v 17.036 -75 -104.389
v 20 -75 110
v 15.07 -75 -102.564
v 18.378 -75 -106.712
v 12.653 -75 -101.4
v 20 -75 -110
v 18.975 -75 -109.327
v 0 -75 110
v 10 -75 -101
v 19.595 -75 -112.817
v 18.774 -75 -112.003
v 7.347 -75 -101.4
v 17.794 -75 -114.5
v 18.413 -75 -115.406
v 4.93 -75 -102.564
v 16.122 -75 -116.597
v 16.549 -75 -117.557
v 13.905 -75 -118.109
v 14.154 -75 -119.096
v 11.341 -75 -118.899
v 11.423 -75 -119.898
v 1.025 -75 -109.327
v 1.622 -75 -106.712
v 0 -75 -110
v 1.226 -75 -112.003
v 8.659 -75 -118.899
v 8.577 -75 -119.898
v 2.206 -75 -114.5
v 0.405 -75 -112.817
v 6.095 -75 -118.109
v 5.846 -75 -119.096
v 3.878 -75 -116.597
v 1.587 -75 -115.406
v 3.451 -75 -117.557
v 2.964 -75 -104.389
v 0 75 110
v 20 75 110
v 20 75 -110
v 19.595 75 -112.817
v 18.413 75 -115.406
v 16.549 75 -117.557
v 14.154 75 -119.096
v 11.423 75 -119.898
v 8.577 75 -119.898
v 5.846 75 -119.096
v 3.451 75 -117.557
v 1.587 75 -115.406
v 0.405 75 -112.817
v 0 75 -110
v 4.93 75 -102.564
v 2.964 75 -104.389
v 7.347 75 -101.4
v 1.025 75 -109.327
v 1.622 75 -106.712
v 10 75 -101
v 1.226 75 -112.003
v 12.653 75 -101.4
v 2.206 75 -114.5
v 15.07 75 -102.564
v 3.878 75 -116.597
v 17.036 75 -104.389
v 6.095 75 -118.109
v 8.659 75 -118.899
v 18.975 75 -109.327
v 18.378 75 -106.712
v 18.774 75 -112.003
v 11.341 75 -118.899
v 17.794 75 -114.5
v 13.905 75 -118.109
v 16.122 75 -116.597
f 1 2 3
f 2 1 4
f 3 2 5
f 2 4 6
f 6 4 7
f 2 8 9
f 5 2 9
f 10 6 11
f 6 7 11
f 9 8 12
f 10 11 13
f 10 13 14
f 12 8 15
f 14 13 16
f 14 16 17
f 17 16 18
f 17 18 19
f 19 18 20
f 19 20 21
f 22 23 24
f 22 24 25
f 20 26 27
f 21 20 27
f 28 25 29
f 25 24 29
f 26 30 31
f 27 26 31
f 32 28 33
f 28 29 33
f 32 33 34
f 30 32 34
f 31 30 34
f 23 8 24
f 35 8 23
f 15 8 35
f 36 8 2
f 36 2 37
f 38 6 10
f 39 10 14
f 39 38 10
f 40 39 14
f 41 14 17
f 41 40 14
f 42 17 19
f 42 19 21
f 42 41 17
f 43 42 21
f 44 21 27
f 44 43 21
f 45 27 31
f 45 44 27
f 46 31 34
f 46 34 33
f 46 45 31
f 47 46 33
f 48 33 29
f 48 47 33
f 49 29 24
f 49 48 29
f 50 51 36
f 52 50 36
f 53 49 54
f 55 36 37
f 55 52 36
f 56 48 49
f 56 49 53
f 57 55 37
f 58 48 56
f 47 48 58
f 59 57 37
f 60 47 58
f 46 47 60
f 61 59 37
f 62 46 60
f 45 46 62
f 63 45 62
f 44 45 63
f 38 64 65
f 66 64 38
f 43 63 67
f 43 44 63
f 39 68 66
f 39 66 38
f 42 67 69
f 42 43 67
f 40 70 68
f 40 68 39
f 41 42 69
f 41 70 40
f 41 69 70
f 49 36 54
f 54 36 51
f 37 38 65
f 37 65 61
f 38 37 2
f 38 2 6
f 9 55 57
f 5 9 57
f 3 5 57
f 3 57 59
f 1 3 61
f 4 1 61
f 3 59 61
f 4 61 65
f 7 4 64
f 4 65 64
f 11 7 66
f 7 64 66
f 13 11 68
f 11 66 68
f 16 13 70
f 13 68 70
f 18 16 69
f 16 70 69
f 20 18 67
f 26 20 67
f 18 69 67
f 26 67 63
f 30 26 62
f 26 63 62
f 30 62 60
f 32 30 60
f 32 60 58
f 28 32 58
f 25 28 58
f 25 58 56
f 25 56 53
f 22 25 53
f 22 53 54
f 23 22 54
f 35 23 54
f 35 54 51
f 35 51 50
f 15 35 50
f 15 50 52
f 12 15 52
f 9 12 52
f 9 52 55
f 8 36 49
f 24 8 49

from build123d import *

# Parameters (mm, degrees)
SKETCH1_W           = 220
SKETCH1_H           = 150
BOSS_EXTRUDE2_DEPTH = 20
SKETCH3_R           = 10
SKETCH3_R_2         = 9
BOSS_EXTRUDE3_DEPTH = 150
SKETCH4_R           = 9
CUT_EXTRUDE1_DEPTH  = 150


with BuildPart() as part:
    # Sketch1 → Boss-Extrude2 (new body)
    with BuildSketch(Plane(origin=(0, 0, 0), x_dir=(0, 0, -1), z_dir=(1, 0, 0))):
        Rectangle(SKETCH1_W, SKETCH1_H)
    extrude(amount=BOSS_EXTRUDE2_DEPTH)

    # Sketch3 → Boss-Extrude3 (add)
    with BuildSketch(Plane(origin=(0, 75, 0), x_dir=(1, 0, 0), z_dir=(0, 1, 0))):
        with Locations((10, 110)):
            Circle(SKETCH3_R)
        with Locations((10, 110)):
            Circle(SKETCH3_R_2, mode=Mode.SUBTRACT)
    extrude(amount=-BOSS_EXTRUDE3_DEPTH)

    # Sketch4 → Cut-Extrude1 (cut)
    with BuildSketch(Plane(origin=(0, 75, 0), x_dir=(1, 0, 0), z_dir=(0, 1, 0))):
        with Locations(Location((10, 110, 0), (0, 0, 270))):
            Circle(SKETCH4_R)
    extrude(amount=-CUT_EXTRUDE1_DEPTH, mode=Mode.SUBTRACT)


solid = part.part
